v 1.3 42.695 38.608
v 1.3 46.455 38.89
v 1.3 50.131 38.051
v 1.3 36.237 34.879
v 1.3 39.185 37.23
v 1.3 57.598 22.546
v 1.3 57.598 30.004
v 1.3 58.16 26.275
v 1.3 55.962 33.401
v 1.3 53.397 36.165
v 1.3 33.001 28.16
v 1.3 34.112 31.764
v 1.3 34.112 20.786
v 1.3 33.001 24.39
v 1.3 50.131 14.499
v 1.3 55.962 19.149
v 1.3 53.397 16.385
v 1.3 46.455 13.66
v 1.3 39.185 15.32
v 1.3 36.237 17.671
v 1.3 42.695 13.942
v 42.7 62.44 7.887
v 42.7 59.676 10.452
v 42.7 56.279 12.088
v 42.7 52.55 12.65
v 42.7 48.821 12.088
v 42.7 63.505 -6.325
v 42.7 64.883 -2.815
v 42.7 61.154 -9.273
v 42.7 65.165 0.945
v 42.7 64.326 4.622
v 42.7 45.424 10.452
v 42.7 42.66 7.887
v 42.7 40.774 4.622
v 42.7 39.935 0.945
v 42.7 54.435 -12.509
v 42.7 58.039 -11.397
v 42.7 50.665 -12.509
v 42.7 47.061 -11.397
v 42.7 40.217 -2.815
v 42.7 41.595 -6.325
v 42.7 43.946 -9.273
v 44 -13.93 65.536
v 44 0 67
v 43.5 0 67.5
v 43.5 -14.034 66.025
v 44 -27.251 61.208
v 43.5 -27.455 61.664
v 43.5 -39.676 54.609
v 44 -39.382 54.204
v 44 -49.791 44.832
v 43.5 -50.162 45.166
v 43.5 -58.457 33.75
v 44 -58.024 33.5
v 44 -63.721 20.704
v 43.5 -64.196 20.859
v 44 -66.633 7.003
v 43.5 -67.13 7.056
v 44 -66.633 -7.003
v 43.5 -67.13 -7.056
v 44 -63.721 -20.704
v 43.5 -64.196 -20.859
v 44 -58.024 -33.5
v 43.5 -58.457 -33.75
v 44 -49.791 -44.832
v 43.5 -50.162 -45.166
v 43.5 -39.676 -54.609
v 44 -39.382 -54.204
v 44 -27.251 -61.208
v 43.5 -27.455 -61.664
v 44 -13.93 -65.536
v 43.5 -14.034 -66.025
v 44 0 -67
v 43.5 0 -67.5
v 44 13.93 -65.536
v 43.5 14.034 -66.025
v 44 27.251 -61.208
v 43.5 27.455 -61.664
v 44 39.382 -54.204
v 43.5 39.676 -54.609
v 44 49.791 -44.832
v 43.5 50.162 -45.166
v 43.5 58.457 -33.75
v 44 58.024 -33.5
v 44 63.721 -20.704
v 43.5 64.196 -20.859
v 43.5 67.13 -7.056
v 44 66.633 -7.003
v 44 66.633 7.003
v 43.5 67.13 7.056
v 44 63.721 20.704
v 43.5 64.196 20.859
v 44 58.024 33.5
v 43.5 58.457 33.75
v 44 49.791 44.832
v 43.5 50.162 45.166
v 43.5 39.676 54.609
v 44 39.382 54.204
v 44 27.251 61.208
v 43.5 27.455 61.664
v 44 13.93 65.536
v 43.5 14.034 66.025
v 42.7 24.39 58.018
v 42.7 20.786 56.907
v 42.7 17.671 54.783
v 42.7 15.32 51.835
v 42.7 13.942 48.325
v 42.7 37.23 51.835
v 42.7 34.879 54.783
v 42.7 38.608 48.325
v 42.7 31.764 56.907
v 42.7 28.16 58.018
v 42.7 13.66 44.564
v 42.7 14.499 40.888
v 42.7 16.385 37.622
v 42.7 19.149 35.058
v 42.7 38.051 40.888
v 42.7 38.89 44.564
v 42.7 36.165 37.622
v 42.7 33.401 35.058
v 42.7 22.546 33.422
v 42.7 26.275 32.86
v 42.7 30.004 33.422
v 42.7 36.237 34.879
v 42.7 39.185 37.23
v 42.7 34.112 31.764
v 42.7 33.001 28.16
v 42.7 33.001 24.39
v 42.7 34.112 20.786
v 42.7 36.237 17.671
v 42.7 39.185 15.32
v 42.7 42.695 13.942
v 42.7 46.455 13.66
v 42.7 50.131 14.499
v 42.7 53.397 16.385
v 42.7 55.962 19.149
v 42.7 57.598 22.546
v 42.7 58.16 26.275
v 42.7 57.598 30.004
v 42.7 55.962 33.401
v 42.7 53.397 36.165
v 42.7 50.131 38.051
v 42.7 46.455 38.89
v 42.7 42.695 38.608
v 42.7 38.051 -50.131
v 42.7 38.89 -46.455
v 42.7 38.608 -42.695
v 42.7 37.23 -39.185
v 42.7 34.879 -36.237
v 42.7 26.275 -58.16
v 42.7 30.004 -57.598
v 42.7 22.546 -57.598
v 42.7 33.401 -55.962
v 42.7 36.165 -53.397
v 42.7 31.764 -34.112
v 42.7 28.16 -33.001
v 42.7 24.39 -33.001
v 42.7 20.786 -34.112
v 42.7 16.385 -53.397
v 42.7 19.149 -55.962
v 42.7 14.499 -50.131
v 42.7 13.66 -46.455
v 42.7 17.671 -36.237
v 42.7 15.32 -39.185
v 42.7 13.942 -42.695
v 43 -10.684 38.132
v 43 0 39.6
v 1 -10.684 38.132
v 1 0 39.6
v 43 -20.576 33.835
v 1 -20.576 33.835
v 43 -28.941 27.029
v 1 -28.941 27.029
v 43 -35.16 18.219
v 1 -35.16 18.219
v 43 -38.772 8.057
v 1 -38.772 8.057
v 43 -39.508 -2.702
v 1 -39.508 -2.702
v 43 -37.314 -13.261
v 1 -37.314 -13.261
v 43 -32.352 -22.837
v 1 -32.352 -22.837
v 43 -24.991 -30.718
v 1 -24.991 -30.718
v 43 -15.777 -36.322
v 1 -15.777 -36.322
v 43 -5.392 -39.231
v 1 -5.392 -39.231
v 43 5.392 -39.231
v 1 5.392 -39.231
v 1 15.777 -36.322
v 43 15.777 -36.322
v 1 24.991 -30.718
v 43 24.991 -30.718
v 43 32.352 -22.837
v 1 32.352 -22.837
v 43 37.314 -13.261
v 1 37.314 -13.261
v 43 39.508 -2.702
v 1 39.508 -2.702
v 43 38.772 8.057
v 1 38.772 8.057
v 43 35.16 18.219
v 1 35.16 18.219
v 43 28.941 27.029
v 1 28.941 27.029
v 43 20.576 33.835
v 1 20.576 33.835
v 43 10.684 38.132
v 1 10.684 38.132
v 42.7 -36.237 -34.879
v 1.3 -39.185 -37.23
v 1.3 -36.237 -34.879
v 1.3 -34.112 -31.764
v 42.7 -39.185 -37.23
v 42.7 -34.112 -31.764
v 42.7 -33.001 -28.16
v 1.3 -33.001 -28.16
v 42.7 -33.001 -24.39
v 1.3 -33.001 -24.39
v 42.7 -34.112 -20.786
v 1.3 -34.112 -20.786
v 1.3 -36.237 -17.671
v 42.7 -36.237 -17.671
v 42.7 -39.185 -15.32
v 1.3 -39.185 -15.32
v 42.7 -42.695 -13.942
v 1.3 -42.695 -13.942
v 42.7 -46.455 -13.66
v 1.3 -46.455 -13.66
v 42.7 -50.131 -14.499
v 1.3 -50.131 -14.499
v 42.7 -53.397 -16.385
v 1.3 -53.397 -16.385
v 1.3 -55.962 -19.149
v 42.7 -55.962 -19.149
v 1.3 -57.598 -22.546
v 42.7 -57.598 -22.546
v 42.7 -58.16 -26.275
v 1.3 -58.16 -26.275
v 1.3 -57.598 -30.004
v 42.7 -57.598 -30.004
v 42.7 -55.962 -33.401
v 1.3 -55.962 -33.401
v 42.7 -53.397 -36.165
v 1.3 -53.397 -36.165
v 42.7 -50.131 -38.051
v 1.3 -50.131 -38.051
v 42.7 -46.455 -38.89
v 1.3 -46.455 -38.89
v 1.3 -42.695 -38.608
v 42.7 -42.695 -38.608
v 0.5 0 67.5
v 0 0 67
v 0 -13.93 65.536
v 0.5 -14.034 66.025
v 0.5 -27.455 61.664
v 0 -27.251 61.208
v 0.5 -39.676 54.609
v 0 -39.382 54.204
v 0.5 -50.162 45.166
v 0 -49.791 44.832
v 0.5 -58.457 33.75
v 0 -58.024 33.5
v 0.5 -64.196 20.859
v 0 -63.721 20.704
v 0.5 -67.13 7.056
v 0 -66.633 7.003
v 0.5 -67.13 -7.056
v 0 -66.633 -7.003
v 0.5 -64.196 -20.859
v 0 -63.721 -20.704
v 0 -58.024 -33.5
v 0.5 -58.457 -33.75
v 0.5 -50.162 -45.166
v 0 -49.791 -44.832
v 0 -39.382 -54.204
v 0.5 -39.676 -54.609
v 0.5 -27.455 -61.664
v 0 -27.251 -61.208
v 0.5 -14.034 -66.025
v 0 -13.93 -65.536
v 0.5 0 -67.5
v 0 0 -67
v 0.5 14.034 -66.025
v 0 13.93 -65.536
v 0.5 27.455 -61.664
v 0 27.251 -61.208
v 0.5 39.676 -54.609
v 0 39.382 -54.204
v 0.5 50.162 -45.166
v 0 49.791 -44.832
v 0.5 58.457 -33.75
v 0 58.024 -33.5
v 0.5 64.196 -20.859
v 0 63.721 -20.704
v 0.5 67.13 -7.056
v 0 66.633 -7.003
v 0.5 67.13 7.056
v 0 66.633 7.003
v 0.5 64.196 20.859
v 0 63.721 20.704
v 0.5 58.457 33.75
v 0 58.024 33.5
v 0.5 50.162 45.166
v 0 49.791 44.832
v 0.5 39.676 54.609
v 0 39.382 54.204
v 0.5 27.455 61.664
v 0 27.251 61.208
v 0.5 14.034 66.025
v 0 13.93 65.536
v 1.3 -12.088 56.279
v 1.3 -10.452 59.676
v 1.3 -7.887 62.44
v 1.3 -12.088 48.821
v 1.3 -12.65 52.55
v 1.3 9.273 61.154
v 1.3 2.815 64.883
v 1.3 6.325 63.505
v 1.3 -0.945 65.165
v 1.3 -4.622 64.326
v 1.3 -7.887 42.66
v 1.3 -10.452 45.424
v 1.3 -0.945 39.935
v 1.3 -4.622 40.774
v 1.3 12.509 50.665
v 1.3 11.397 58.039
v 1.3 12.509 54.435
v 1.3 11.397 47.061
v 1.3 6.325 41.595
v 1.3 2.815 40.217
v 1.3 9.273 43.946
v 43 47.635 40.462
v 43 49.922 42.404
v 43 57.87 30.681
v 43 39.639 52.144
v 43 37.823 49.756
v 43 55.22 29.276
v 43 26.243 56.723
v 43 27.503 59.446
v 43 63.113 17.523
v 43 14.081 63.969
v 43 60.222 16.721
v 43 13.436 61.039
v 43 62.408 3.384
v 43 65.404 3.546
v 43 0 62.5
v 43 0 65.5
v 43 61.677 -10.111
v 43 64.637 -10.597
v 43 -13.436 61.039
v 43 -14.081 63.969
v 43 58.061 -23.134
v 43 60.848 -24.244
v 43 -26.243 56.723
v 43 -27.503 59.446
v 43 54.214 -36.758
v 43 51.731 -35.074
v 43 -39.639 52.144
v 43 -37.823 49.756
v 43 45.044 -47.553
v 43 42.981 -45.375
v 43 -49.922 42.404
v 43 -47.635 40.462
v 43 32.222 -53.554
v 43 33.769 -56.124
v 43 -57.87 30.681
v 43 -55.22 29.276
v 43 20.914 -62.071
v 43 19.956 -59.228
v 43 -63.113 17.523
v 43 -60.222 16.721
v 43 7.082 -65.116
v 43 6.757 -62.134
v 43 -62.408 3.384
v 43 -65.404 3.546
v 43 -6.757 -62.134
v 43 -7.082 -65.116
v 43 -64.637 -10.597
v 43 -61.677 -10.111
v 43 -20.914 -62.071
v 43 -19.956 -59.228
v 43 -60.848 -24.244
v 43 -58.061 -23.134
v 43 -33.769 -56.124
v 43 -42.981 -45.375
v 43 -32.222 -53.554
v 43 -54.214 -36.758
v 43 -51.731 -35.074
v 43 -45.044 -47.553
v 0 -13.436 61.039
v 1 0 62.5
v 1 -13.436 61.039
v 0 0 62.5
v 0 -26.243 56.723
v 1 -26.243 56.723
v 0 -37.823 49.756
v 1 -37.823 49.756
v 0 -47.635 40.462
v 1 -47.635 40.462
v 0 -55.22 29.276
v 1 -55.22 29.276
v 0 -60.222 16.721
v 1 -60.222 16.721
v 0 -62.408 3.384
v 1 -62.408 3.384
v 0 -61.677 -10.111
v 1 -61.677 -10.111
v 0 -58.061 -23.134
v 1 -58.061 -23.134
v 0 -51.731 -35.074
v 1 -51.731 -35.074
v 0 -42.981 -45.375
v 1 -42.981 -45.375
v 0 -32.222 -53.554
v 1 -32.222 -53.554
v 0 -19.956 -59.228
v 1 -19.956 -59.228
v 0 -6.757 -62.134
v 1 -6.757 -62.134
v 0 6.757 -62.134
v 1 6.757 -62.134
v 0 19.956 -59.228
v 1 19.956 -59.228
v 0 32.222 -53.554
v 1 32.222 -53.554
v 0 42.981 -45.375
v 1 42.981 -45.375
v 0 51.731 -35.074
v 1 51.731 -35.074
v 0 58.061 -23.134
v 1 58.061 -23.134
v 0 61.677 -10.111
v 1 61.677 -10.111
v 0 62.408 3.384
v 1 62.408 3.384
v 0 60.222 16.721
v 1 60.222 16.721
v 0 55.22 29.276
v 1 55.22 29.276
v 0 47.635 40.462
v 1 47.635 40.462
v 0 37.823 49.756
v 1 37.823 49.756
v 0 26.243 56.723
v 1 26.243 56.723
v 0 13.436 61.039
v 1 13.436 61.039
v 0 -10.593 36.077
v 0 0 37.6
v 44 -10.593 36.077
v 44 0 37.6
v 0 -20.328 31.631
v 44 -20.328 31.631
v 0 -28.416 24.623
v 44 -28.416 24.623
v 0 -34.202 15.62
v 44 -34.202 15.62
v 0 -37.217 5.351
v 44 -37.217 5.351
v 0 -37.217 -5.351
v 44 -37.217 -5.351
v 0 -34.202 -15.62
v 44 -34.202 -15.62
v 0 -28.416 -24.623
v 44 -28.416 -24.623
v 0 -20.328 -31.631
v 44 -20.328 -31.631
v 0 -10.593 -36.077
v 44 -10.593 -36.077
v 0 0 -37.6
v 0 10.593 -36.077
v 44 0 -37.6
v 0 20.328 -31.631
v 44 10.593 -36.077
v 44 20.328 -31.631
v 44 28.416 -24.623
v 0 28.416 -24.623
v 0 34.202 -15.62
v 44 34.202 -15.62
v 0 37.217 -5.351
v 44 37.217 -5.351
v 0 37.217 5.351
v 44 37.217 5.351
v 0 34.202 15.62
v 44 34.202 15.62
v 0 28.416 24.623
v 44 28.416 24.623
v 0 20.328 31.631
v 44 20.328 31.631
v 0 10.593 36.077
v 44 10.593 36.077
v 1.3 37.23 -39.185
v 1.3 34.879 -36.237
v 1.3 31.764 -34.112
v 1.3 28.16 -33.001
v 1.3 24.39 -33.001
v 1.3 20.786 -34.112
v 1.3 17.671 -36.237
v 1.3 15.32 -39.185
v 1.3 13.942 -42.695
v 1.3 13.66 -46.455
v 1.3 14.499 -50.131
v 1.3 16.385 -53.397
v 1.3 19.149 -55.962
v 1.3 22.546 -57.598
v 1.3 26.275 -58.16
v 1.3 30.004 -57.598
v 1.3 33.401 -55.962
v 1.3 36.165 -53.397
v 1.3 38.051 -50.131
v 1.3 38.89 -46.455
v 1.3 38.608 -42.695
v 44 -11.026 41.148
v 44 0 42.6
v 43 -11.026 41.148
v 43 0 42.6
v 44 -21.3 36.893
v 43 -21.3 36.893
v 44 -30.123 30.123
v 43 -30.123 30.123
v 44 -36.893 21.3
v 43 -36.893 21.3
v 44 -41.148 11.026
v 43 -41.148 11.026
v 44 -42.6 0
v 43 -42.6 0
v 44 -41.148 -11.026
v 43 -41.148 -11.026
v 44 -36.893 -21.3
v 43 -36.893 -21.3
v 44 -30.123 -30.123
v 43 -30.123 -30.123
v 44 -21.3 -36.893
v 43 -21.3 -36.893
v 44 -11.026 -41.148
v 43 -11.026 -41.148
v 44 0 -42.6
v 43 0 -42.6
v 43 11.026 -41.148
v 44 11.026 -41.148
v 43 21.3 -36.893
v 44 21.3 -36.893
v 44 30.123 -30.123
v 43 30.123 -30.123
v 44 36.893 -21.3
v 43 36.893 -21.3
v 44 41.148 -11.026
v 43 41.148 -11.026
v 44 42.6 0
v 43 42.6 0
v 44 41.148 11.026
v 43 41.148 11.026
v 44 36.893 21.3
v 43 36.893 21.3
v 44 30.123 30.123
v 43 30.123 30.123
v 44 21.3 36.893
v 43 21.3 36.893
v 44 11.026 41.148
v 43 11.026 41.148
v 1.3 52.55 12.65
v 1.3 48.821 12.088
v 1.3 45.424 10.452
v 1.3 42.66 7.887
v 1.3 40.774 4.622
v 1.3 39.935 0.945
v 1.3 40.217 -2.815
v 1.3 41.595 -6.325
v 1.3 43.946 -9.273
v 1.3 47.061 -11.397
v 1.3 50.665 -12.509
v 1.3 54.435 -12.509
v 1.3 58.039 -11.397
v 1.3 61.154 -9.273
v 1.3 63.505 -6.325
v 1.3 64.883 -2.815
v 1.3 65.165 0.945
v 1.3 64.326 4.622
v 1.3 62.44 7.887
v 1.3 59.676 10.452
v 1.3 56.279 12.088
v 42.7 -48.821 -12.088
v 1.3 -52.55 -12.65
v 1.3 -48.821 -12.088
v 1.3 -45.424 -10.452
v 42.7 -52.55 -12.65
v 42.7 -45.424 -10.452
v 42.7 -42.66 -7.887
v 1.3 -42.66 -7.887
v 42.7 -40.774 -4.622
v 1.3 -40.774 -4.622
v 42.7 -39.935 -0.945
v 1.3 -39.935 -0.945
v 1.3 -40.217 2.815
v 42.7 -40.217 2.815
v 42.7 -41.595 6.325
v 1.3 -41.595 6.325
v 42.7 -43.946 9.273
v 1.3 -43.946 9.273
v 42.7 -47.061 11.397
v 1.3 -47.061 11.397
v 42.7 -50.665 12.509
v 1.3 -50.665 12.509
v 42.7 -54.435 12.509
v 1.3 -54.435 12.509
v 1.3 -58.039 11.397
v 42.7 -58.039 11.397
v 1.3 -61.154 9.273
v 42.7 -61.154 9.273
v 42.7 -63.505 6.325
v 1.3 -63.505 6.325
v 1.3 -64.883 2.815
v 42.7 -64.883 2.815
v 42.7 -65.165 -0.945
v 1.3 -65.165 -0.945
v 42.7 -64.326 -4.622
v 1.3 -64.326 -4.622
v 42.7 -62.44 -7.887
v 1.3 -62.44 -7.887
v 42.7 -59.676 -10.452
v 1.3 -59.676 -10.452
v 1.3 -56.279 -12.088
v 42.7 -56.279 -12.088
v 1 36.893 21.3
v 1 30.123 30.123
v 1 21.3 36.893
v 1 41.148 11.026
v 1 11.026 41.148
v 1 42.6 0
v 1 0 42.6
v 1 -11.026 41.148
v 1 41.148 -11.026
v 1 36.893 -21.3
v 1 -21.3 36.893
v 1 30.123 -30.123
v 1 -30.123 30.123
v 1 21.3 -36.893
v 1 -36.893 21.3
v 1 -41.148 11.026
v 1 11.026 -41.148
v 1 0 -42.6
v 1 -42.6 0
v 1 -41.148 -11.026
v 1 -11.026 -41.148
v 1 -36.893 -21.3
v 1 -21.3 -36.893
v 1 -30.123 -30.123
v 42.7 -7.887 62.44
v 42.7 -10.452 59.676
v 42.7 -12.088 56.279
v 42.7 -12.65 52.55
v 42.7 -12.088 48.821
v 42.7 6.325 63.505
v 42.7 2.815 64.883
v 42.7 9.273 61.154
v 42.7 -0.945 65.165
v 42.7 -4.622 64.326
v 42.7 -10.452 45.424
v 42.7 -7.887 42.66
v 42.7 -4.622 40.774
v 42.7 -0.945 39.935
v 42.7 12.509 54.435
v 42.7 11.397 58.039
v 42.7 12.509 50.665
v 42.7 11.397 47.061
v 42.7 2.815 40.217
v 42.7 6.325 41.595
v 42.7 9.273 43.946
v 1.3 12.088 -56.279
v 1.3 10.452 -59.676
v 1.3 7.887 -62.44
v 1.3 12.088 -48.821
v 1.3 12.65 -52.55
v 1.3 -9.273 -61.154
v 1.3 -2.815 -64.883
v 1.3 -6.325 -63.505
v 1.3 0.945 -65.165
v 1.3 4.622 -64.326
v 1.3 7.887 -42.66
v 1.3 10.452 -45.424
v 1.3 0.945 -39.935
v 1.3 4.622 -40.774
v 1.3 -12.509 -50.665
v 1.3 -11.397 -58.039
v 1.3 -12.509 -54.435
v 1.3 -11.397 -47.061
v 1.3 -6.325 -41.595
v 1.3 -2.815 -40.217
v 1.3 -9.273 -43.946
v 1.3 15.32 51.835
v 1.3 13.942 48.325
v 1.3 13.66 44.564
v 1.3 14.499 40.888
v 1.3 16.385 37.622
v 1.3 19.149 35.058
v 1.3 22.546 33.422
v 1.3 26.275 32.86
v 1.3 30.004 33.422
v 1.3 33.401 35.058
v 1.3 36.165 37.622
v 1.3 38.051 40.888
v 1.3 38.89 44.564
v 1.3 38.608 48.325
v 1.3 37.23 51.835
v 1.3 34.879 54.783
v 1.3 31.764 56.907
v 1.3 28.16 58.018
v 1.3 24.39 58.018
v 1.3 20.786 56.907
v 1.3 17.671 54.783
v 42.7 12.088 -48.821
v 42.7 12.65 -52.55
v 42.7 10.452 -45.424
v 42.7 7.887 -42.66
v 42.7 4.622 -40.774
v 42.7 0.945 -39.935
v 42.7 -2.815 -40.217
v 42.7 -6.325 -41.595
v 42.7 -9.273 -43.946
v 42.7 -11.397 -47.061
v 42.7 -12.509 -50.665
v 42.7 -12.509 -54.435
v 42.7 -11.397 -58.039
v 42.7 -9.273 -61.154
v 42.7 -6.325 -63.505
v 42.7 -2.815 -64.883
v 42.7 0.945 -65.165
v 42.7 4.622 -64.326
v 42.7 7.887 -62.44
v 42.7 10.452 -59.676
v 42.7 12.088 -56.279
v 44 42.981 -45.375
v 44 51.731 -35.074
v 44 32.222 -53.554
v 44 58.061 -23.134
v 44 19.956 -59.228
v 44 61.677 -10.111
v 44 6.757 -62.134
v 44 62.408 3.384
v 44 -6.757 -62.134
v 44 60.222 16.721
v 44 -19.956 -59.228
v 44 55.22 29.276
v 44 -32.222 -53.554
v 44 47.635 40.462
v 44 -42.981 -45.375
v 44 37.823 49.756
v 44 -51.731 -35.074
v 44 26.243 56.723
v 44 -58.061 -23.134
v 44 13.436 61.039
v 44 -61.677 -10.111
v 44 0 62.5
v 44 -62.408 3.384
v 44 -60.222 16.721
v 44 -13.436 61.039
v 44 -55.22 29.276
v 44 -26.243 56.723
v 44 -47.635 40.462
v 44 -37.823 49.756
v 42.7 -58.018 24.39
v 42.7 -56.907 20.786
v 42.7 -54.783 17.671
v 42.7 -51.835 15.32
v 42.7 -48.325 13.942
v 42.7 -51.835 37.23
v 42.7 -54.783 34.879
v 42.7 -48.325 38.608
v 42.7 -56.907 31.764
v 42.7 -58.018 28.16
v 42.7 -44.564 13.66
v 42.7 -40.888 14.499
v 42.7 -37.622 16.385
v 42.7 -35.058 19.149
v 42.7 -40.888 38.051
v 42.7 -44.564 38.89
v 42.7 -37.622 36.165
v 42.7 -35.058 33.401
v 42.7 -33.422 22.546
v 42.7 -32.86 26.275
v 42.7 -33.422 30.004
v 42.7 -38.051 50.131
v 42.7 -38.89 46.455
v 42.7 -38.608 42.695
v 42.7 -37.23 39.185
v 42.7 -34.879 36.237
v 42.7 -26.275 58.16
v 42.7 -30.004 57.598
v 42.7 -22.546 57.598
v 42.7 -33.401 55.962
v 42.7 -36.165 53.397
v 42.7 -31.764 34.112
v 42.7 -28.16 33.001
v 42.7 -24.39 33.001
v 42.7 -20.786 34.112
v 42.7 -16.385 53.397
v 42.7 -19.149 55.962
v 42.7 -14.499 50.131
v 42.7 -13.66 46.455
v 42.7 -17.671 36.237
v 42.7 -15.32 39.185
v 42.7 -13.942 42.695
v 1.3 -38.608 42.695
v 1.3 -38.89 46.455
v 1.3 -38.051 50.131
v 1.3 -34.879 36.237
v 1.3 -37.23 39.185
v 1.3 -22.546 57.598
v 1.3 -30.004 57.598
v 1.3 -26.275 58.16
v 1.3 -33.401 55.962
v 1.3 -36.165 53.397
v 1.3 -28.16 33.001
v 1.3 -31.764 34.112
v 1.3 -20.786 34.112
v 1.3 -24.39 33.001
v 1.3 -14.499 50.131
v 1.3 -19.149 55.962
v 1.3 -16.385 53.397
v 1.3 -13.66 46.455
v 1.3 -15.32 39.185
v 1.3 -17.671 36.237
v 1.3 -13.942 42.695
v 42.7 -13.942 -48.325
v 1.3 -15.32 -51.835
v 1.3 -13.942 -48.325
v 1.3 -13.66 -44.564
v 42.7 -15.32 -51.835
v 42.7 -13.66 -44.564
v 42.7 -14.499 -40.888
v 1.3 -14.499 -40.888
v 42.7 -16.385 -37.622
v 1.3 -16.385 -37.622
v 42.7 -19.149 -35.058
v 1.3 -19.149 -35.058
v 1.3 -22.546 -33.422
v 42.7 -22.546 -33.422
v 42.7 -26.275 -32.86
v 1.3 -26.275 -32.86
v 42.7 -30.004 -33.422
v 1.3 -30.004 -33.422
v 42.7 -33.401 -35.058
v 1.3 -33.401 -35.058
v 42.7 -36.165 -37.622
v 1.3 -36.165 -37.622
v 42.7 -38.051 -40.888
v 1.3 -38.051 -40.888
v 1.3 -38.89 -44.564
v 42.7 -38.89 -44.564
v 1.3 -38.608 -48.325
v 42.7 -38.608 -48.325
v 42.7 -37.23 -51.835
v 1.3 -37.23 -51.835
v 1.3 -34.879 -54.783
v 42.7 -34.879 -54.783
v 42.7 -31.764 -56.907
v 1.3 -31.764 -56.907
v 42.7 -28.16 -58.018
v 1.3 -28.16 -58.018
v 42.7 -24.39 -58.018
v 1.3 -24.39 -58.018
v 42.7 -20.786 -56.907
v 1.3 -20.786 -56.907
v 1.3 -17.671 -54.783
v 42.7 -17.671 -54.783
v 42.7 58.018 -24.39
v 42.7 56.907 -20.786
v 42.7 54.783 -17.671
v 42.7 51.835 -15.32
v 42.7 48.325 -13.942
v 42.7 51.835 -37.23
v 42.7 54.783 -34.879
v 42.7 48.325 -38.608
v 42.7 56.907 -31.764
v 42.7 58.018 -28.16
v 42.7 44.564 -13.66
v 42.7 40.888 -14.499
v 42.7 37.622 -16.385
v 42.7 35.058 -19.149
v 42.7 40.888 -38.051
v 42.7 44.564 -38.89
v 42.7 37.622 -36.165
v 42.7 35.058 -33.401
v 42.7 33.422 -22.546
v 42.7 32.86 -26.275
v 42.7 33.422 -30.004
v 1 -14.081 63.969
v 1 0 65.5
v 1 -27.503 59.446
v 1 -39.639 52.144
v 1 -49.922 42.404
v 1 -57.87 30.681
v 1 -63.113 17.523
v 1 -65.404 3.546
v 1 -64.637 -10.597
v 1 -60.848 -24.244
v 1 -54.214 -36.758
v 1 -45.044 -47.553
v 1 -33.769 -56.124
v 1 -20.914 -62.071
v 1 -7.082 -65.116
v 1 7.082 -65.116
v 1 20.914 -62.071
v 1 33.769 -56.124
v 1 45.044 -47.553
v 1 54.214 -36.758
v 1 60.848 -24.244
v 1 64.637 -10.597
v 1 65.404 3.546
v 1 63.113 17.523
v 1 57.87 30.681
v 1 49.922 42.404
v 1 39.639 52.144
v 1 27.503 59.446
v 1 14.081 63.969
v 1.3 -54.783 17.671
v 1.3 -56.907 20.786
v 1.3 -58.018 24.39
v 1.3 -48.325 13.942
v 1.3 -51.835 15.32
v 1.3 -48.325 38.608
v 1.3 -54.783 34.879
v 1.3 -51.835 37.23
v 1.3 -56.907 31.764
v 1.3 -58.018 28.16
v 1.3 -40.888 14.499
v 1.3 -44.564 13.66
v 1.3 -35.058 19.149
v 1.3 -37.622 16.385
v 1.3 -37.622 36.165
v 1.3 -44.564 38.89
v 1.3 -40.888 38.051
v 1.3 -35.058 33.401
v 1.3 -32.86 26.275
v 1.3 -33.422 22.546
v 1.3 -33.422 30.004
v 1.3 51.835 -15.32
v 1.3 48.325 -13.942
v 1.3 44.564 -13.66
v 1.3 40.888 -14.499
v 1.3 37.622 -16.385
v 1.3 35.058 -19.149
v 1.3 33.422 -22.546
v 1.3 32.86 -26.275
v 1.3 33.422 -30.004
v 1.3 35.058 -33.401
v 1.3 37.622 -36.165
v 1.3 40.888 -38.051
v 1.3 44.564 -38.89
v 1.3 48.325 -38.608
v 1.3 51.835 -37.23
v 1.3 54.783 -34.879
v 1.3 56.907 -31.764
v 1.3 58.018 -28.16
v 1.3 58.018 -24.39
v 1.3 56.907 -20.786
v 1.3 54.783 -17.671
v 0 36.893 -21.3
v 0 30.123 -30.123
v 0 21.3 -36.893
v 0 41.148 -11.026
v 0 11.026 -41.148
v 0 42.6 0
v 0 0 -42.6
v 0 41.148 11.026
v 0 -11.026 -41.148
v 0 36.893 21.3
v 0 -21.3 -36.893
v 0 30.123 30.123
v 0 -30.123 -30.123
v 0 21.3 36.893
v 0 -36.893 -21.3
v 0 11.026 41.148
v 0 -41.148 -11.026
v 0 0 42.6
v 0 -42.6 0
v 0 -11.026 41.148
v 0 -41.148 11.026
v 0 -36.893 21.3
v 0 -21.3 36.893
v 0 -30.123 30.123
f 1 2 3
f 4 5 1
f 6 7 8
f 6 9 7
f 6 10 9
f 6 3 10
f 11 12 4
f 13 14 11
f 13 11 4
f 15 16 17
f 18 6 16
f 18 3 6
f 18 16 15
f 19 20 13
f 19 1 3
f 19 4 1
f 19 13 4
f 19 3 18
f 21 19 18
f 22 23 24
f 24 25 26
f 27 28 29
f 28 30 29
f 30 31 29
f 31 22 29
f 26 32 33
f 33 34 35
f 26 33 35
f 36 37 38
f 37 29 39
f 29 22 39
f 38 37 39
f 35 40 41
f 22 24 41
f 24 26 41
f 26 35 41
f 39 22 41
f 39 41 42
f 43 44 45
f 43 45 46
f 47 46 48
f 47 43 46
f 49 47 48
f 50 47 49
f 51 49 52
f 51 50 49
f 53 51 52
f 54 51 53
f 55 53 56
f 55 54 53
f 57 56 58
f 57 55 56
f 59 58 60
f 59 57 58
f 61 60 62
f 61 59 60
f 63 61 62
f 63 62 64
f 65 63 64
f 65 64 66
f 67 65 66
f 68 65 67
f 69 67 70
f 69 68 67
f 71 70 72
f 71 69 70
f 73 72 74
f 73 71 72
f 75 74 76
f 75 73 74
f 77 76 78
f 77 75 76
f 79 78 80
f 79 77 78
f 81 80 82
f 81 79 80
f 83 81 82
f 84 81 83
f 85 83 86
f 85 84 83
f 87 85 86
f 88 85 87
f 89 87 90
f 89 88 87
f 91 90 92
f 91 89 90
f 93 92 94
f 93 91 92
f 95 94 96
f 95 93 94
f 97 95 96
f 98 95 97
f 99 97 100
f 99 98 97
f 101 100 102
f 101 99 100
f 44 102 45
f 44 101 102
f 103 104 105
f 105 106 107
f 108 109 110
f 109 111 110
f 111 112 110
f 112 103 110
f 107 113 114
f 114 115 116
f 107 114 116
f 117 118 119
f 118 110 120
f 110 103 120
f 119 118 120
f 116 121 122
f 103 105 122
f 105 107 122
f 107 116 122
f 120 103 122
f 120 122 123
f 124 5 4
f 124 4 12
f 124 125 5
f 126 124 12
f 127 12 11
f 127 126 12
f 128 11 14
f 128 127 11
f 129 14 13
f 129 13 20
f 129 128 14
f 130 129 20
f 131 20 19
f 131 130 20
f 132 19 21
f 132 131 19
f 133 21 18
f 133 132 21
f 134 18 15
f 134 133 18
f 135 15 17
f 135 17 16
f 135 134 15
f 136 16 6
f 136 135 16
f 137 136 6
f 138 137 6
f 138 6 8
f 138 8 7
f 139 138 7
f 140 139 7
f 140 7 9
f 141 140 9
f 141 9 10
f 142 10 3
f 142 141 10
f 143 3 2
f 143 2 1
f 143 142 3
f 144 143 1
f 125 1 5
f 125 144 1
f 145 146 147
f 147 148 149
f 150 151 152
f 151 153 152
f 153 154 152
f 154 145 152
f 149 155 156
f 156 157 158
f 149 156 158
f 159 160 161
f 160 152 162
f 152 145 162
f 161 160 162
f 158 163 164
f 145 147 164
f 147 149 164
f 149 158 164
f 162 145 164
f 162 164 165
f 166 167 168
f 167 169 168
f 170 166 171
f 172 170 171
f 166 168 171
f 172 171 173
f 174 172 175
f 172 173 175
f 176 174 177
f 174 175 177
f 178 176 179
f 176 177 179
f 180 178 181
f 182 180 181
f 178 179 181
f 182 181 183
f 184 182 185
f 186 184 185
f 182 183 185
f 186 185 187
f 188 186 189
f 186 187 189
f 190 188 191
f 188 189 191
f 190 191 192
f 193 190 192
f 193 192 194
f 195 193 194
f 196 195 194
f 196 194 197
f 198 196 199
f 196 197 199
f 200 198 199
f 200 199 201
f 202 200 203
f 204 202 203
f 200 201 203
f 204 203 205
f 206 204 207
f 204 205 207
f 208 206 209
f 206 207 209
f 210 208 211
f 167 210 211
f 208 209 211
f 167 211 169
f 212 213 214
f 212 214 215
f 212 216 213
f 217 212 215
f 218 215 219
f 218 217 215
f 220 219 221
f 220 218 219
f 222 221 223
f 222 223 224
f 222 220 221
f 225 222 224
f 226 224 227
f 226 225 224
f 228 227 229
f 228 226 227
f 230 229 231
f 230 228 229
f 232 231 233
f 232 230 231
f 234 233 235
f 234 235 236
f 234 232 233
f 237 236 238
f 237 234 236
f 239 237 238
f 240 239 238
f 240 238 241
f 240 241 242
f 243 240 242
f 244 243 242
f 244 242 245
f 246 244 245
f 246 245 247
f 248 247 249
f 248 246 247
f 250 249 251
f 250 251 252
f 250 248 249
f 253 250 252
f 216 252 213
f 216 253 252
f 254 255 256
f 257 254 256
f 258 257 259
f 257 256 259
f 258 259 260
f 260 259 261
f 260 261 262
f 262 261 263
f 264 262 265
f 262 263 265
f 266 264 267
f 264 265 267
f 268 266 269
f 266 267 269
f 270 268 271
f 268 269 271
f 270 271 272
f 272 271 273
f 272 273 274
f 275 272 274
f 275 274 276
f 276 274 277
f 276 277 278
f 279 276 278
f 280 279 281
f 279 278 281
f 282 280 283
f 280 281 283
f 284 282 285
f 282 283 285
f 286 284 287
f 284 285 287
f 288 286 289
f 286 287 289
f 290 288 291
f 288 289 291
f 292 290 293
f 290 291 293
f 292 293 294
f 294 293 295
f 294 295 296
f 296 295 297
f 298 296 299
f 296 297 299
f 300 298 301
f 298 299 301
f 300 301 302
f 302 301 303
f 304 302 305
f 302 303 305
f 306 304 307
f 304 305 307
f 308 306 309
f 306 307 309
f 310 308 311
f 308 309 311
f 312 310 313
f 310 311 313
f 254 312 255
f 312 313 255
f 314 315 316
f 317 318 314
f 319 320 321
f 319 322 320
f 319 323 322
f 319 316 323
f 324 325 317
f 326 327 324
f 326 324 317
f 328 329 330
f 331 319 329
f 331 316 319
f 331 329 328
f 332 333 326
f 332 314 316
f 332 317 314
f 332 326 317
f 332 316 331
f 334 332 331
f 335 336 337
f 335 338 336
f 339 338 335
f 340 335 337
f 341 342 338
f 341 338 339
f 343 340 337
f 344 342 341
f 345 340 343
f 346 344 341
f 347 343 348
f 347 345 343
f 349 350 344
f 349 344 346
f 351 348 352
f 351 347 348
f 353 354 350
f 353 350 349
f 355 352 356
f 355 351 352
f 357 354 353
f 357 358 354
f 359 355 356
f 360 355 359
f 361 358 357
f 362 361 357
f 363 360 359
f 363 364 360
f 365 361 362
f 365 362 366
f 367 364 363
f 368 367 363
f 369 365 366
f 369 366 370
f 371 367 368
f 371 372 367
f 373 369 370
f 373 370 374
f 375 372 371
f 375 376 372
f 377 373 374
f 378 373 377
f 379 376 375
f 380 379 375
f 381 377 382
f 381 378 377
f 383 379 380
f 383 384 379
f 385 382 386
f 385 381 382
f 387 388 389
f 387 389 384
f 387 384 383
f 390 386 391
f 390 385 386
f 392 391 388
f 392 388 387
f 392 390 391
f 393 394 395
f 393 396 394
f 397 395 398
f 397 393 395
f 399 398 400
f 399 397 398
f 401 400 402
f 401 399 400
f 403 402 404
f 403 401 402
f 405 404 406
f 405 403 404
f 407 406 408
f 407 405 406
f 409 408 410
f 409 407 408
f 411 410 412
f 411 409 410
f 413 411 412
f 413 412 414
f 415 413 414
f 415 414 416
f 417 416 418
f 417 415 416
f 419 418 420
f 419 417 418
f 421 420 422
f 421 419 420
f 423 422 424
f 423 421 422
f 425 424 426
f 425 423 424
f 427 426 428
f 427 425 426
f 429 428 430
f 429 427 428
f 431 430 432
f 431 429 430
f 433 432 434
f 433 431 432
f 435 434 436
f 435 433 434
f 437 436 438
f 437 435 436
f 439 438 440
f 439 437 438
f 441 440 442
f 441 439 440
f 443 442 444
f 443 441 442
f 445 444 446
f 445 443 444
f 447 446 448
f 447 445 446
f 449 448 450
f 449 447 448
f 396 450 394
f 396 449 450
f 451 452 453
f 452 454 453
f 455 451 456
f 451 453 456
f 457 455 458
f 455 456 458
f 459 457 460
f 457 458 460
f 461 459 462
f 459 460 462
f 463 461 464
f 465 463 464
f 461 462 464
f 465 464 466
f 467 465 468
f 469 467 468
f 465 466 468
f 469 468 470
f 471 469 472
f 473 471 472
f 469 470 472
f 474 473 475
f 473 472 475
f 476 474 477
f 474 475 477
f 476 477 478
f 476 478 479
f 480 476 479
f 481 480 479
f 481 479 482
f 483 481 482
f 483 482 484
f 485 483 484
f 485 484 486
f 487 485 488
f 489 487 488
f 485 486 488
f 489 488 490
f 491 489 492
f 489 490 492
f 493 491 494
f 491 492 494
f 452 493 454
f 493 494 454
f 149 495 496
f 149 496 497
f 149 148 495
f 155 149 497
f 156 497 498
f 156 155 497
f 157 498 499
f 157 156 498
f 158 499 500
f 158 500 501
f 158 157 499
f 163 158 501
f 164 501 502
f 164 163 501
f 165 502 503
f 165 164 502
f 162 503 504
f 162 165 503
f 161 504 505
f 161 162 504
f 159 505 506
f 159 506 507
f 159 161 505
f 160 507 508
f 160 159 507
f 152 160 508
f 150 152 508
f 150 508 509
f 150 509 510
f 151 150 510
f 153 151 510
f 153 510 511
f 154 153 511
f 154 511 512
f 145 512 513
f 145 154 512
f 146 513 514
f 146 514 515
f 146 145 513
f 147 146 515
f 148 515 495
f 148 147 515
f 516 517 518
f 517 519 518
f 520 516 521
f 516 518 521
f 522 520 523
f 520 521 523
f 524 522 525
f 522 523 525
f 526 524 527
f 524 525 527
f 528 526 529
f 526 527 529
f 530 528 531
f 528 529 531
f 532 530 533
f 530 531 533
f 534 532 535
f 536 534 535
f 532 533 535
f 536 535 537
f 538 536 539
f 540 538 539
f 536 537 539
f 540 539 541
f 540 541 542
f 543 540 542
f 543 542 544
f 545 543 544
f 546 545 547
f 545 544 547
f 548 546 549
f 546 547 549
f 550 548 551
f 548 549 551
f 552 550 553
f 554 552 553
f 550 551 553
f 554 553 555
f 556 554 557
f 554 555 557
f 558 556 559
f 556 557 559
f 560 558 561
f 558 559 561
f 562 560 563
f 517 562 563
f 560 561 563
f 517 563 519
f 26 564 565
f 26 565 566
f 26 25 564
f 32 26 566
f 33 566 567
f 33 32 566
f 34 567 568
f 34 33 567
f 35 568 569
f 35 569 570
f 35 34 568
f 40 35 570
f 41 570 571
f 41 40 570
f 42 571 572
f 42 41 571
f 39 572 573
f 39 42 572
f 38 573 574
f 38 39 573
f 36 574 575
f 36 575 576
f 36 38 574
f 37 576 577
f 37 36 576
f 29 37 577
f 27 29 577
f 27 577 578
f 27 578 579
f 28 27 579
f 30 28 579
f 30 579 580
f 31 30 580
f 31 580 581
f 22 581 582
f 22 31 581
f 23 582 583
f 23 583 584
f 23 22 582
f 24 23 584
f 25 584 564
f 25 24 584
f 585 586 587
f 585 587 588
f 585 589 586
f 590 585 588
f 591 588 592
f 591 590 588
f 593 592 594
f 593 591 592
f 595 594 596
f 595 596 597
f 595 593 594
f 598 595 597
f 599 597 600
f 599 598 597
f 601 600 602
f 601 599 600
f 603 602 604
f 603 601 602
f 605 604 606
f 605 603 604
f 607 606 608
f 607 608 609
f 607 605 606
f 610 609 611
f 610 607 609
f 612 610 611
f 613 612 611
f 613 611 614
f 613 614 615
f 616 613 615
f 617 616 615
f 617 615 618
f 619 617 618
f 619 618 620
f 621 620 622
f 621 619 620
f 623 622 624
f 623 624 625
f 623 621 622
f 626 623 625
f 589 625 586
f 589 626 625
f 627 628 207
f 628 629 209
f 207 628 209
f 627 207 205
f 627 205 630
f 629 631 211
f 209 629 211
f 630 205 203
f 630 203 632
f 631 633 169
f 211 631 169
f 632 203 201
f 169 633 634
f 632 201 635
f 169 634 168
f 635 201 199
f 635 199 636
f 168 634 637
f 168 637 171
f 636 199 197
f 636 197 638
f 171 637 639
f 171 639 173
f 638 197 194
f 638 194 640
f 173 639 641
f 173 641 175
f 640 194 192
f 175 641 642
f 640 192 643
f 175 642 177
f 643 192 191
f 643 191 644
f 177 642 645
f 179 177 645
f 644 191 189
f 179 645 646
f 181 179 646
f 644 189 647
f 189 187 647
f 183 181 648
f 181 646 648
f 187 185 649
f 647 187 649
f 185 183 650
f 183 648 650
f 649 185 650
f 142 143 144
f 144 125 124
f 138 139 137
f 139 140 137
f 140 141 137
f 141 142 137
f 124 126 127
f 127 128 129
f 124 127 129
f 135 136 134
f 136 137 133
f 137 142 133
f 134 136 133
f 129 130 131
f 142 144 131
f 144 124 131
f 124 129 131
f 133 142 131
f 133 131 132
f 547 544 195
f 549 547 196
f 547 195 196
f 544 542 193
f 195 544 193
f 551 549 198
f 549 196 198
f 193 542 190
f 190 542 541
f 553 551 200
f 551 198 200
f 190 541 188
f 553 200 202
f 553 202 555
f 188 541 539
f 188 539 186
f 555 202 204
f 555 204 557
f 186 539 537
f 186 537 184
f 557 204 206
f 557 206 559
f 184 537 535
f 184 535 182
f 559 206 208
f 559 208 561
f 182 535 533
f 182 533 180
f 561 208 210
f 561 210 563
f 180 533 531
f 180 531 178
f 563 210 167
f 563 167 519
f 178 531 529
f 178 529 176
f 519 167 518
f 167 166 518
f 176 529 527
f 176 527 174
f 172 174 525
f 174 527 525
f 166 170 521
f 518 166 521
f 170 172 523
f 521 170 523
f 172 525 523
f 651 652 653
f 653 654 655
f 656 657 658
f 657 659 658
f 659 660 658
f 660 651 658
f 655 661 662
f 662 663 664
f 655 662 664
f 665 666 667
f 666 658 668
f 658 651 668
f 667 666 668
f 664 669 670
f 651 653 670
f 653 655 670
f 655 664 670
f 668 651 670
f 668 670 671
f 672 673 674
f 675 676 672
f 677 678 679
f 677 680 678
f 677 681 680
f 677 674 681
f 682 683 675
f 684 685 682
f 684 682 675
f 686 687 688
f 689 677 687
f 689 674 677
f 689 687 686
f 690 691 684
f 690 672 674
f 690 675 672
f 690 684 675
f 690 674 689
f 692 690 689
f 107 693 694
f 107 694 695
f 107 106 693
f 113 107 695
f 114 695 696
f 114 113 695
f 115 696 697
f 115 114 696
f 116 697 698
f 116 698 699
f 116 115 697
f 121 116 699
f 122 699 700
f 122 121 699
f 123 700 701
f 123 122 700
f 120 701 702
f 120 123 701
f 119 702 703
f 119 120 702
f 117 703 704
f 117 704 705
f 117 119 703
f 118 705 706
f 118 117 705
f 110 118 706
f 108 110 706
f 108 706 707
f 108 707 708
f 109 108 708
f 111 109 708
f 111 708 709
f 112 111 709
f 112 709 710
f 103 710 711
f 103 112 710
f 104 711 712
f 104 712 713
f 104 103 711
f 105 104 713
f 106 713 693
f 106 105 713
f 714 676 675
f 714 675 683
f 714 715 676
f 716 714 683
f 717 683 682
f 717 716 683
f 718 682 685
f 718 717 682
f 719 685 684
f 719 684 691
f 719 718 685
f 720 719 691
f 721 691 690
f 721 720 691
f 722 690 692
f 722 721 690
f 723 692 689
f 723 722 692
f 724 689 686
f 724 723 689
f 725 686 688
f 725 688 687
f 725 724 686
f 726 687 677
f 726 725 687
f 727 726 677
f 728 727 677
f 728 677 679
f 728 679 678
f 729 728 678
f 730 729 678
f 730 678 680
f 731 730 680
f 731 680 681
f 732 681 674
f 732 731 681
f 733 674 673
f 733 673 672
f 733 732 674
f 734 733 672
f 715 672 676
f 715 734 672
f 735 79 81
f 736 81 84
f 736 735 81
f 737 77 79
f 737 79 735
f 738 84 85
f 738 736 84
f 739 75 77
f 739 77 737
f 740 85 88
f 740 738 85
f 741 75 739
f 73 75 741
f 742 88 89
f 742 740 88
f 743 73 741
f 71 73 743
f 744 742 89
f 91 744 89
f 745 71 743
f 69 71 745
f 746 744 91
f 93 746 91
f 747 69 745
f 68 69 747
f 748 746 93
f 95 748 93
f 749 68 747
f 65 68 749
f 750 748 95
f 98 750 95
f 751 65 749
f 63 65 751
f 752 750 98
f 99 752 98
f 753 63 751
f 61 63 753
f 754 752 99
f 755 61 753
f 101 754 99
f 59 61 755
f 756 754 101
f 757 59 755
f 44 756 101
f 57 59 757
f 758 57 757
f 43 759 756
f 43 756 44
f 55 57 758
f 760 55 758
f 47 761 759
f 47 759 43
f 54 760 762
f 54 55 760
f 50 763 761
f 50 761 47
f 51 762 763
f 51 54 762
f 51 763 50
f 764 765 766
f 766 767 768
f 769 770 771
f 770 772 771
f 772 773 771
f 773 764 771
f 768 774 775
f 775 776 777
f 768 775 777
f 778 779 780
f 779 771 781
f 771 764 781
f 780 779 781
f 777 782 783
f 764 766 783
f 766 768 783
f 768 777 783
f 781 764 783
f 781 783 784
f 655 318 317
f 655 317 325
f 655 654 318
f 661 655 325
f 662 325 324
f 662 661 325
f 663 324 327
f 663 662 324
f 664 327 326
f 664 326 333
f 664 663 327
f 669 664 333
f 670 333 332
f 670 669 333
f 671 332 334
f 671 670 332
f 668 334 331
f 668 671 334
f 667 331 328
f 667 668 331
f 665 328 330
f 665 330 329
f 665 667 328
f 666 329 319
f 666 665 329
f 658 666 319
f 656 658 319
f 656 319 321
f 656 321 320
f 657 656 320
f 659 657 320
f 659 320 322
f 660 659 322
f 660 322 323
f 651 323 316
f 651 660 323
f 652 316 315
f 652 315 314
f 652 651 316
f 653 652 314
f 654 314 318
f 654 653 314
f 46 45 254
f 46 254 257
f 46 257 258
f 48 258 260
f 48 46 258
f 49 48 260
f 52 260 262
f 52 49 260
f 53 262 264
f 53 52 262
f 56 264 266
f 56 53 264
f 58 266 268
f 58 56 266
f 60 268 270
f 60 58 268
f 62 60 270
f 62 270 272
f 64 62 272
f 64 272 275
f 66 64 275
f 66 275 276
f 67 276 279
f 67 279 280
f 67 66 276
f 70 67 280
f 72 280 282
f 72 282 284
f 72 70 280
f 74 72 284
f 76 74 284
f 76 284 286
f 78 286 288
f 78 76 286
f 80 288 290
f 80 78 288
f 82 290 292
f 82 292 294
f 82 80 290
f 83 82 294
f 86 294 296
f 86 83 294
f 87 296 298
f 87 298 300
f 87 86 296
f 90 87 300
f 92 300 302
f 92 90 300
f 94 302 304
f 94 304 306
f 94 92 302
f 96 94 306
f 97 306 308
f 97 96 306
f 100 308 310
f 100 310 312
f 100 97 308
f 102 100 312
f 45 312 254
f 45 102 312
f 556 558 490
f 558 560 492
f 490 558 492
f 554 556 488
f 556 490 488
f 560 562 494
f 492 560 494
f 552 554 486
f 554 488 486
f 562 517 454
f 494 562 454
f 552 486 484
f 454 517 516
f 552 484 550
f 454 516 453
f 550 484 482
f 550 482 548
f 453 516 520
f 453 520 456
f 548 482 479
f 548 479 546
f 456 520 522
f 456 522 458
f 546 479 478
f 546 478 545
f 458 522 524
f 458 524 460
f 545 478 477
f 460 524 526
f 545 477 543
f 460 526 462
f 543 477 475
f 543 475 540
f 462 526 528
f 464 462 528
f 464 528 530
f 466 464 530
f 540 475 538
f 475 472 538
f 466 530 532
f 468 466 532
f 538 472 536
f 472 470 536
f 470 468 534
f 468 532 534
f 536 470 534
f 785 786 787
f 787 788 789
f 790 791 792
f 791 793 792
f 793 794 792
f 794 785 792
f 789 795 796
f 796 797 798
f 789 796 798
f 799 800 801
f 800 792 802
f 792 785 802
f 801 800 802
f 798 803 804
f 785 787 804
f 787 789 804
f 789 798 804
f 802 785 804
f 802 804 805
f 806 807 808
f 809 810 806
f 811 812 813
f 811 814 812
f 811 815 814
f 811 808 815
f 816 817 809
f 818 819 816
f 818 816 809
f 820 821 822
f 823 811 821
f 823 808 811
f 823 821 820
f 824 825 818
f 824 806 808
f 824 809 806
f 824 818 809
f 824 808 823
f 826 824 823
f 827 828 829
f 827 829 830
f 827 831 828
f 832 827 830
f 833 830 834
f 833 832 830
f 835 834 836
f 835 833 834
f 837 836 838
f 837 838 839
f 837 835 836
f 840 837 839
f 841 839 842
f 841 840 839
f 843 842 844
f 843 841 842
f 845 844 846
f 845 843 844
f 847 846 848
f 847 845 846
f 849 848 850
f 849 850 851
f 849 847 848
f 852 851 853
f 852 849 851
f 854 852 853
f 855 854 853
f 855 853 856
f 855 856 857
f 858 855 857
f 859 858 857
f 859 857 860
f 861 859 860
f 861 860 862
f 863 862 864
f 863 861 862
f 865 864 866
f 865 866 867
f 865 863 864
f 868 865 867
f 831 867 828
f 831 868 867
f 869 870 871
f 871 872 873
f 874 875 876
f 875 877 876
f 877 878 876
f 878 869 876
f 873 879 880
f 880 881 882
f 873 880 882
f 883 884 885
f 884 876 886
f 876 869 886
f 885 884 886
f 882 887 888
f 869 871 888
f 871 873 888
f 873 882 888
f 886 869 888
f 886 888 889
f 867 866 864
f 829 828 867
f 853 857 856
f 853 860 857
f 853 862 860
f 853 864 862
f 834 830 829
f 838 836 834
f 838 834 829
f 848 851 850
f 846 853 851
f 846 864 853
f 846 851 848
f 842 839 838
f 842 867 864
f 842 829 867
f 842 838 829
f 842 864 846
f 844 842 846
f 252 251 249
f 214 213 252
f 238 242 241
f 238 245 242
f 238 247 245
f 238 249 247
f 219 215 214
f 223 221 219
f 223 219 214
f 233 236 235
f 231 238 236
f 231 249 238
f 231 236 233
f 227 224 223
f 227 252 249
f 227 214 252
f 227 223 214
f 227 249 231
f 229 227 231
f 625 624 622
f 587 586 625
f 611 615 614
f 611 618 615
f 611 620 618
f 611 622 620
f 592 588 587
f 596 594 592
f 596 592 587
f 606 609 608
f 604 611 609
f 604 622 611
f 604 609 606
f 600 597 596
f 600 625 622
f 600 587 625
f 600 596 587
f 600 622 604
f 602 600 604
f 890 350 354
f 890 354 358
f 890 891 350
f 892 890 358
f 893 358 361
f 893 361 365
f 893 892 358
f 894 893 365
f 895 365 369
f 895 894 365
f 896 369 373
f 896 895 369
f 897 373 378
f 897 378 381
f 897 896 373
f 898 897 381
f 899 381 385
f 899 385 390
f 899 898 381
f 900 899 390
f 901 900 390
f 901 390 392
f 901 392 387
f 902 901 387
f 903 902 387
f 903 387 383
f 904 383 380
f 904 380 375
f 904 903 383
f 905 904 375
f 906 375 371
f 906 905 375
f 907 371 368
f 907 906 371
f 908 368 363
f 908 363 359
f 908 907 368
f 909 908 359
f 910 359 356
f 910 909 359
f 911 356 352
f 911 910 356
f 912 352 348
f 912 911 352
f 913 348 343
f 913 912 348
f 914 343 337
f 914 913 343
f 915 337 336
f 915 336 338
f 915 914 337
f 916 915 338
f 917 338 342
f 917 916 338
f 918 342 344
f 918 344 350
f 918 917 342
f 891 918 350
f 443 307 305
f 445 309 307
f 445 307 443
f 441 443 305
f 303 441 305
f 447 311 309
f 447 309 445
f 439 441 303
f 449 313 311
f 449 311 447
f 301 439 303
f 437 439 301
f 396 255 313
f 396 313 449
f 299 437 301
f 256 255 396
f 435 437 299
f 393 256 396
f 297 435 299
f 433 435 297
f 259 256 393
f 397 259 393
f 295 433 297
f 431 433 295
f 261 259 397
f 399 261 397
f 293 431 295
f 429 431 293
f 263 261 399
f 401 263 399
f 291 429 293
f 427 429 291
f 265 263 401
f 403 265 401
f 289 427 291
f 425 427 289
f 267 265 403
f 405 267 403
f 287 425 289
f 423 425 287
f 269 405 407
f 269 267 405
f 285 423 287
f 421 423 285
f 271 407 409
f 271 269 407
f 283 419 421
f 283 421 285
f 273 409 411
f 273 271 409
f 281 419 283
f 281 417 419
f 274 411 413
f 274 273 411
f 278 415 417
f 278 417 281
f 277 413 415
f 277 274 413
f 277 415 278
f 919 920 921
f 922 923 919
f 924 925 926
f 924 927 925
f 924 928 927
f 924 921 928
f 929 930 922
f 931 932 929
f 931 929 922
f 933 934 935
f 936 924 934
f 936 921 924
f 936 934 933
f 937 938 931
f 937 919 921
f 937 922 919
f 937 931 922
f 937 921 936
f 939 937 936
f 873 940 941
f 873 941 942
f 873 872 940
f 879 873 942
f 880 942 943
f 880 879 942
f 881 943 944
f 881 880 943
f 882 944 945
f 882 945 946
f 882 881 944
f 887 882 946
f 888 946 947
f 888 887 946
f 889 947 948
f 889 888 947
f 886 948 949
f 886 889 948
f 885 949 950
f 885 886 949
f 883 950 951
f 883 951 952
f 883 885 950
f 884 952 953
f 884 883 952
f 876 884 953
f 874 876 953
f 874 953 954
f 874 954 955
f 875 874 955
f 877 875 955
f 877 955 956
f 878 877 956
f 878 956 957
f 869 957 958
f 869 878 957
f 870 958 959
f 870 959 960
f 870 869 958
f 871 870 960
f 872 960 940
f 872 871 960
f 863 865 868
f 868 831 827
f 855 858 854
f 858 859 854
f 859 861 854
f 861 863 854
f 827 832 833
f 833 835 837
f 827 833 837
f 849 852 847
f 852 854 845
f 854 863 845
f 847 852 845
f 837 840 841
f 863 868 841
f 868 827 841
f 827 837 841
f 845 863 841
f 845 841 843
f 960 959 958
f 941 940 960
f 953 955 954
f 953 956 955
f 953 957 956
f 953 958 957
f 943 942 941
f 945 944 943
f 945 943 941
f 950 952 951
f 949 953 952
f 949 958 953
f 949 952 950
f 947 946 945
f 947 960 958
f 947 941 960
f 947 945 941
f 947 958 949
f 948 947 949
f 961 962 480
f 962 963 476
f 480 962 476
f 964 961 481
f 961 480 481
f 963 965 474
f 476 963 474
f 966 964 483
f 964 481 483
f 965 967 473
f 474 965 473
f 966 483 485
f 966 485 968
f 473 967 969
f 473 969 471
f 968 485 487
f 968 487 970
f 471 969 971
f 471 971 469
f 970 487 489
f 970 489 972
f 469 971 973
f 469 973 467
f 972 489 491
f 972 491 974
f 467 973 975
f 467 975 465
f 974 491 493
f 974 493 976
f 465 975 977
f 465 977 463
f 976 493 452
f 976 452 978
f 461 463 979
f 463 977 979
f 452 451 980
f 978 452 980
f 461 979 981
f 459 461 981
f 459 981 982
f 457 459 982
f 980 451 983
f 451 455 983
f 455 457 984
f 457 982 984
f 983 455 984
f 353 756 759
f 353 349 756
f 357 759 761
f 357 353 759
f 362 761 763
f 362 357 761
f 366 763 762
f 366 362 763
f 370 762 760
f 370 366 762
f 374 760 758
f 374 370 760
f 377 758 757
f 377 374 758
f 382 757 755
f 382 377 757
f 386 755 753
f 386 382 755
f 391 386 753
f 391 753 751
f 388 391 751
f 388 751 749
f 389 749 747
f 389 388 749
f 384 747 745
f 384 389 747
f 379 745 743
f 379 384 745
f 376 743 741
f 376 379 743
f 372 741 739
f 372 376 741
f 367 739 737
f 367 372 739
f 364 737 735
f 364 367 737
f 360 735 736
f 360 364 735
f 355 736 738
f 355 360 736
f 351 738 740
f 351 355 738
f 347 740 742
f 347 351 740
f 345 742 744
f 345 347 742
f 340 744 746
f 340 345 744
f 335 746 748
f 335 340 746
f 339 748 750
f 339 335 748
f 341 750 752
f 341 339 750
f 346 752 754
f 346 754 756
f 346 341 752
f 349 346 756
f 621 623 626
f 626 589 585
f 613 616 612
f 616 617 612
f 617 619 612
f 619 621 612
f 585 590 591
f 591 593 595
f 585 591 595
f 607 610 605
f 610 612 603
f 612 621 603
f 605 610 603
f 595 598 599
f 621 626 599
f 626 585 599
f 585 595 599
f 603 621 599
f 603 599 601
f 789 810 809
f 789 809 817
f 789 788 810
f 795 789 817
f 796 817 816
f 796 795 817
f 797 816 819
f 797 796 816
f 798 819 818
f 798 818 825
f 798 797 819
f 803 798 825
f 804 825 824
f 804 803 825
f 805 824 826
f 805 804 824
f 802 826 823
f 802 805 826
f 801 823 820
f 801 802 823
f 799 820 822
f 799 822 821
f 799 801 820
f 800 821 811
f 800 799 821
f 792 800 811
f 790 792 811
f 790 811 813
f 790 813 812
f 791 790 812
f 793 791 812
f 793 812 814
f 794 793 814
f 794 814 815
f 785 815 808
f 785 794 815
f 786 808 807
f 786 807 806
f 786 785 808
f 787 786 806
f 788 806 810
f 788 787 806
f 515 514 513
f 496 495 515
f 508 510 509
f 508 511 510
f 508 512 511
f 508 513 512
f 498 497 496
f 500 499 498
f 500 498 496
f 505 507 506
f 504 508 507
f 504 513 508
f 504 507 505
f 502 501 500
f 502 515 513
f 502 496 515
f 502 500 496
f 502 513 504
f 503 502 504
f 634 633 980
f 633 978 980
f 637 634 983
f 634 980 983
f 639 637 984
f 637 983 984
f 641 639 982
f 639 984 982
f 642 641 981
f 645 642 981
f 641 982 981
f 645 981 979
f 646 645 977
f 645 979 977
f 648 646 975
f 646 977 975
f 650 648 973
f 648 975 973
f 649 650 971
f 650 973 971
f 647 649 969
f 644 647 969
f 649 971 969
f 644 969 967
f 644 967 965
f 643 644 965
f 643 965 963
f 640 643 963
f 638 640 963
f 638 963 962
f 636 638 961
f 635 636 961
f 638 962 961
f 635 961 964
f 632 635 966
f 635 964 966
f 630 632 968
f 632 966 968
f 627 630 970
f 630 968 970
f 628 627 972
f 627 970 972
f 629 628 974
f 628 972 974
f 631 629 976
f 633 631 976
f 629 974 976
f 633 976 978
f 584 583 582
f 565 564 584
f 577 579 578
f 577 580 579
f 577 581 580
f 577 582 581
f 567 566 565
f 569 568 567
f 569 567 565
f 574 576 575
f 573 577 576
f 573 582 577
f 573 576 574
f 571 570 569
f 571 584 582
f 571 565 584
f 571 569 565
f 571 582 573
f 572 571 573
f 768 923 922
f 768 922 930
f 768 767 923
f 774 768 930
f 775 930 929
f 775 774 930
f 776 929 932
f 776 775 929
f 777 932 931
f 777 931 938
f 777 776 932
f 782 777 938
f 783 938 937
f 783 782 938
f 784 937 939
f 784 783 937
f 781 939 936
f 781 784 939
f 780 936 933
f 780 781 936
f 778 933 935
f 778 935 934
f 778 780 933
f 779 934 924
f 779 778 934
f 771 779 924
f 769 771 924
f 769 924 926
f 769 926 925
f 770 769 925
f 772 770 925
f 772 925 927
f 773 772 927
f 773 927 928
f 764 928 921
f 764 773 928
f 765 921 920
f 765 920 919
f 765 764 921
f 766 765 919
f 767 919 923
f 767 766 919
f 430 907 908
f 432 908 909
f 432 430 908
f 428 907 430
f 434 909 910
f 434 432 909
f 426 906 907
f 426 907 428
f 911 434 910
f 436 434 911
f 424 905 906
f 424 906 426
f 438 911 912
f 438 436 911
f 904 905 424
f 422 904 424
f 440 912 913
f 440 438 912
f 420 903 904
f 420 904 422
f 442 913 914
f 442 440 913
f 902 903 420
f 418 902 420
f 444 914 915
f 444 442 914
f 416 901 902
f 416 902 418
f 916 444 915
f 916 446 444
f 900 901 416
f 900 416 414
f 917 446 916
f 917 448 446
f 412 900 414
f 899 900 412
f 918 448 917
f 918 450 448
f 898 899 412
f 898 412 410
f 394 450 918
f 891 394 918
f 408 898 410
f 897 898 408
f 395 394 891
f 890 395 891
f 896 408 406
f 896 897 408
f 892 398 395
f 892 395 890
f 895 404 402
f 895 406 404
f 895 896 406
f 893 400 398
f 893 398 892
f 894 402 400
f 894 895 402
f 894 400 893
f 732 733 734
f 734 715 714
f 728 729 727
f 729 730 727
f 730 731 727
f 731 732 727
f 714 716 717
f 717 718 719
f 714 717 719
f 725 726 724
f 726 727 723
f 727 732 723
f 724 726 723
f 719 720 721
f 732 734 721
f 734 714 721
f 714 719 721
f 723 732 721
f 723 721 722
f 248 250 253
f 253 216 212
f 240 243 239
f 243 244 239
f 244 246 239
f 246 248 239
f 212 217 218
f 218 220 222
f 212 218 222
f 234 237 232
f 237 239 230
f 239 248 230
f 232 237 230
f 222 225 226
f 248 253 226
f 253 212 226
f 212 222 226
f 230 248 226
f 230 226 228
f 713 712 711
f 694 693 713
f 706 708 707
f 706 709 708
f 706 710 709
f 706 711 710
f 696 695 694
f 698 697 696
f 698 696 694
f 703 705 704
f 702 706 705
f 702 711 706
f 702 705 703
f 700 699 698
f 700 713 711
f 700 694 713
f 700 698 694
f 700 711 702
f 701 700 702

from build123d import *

# Parameters (mm, degrees)
SKETCH_2_W               = 41.4
SKETCH_2_H               = 12.65
PATTERN_CIRCULAR_3_COUNT = 12
CHAMFER_1_SIZE           = 0.5


with BuildPart() as part:
    # 草图1 → 旋转1 (revolve)
    with BuildSketch(Plane.XY, mode=Mode.PRIVATE) as revolve_1_sk:
        Polygon((0, 37.6), (44, 37.6), (44, 42.6), (43, 42.6), (43, 39.6), (1, 39.6), (1, 42.6), (0, 42.6), align=None)
        Polygon((0, 67.5), (44, 67.5), (44, 62.5), (43, 62.5), (43, 65.5), (1, 65.5), (1, 62.5), (0, 62.5), align=None)
    revolve(revolve_1_sk.sketch.rotate(Axis((0, 0, 0), (1, 0, 0)), 90), axis=Axis((0, 0, 0), (1, 0, 0)))

    # 倒角1
    chamfer_1_edges = [part.edges().sort_by_distance(p)[0] for p in [
        (0, 0, -67.5),
        (44, 0, -67.5),
    ]]
    chamfer(chamfer_1_edges, length=CHAMFER_1_SIZE)


with BuildPart() as body_2:
    # 草图2 → 旋转2 (revolve)
    with BuildSketch(Plane.XY, mode=Mode.PRIVATE) as revolve_2_sk:
        with Locations((22, 58.875)):
            Rectangle(SKETCH_2_W, SKETCH_2_H)
    revolve(revolve_2_sk.sketch.rotate(Axis((1.3, 52.55, 0), (1, 0, 0)), 90), axis=Axis((1.3, 52.55, 0), (1, 0, 0)))


with BuildPart() as pattern_circular_3_1:
    # 阵列(圆周)3: pattern copy
    add(body_2.part.rotate(Axis((0, 0, 0), (1, 0, 0)), 1 * 360 / PATTERN_CIRCULAR_3_COUNT))


with BuildPart() as pattern_circular_3_2:
    # 阵列(圆周)3: pattern copy
    add(body_2.part.rotate(Axis((0, 0, 0), (1, 0, 0)), 2 * 360 / PATTERN_CIRCULAR_3_COUNT))


with BuildPart() as pattern_circular_3_3:
    # 阵列(圆周)3: pattern copy
    add(body_2.part.rotate(Axis((0, 0, 0), (1, 0, 0)), 3 * 360 / PATTERN_CIRCULAR_3_COUNT))


with BuildPart() as pattern_circular_3_4:
    # 阵列(圆周)3: pattern copy
    add(body_2.part.rotate(Axis((0, 0, 0), (1, 0, 0)), 4 * 360 / PATTERN_CIRCULAR_3_COUNT))


with BuildPart() as pattern_circular_3_5:
    # 阵列(圆周)3: pattern copy
    add(body_2.part.rotate(Axis((0, 0, 0), (1, 0, 0)), 5 * 360 / PATTERN_CIRCULAR_3_COUNT))


with BuildPart() as pattern_circular_3_6:
    # 阵列(圆周)3: pattern copy
    add(body_2.part.rotate(Axis((0, 0, 0), (1, 0, 0)), 6 * 360 / PATTERN_CIRCULAR_3_COUNT))


with BuildPart() as pattern_circular_3_7:
    # 阵列(圆周)3: pattern copy
    add(body_2.part.rotate(Axis((0, 0, 0), (1, 0, 0)), 7 * 360 / PATTERN_CIRCULAR_3_COUNT))


with BuildPart() as pattern_circular_3_8:
    # 阵列(圆周)3: pattern copy
    add(body_2.part.rotate(Axis((0, 0, 0), (1, 0, 0)), 8 * 360 / PATTERN_CIRCULAR_3_COUNT))


with BuildPart() as pattern_circular_3_9:
    # 阵列(圆周)3: pattern copy
    add(body_2.part.rotate(Axis((0, 0, 0), (1, 0, 0)), 9 * 360 / PATTERN_CIRCULAR_3_COUNT))


with BuildPart() as pattern_circular_3_10:
    # 阵列(圆周)3: pattern copy
    add(body_2.part.rotate(Axis((0, 0, 0), (1, 0, 0)), 10 * 360 / PATTERN_CIRCULAR_3_COUNT))


with BuildPart() as pattern_circular_3_11:
    # 阵列(圆周)3: pattern copy
    add(body_2.part.rotate(Axis((0, 0, 0), (1, 0, 0)), 11 * 360 / PATTERN_CIRCULAR_3_COUNT))


solid = Compound([part.part, body_2.part, pattern_circular_3_1.part, pattern_circular_3_2.part, pattern_circular_3_3.part, pattern_circular_3_4.part, pattern_circular_3_5.part, pattern_circular_3_6.part, pattern_circular_3_7.part, pattern_circular_3_8.part, pattern_circular_3_9.part, pattern_circular_3_10.part, pattern_circular_3_11.part])
